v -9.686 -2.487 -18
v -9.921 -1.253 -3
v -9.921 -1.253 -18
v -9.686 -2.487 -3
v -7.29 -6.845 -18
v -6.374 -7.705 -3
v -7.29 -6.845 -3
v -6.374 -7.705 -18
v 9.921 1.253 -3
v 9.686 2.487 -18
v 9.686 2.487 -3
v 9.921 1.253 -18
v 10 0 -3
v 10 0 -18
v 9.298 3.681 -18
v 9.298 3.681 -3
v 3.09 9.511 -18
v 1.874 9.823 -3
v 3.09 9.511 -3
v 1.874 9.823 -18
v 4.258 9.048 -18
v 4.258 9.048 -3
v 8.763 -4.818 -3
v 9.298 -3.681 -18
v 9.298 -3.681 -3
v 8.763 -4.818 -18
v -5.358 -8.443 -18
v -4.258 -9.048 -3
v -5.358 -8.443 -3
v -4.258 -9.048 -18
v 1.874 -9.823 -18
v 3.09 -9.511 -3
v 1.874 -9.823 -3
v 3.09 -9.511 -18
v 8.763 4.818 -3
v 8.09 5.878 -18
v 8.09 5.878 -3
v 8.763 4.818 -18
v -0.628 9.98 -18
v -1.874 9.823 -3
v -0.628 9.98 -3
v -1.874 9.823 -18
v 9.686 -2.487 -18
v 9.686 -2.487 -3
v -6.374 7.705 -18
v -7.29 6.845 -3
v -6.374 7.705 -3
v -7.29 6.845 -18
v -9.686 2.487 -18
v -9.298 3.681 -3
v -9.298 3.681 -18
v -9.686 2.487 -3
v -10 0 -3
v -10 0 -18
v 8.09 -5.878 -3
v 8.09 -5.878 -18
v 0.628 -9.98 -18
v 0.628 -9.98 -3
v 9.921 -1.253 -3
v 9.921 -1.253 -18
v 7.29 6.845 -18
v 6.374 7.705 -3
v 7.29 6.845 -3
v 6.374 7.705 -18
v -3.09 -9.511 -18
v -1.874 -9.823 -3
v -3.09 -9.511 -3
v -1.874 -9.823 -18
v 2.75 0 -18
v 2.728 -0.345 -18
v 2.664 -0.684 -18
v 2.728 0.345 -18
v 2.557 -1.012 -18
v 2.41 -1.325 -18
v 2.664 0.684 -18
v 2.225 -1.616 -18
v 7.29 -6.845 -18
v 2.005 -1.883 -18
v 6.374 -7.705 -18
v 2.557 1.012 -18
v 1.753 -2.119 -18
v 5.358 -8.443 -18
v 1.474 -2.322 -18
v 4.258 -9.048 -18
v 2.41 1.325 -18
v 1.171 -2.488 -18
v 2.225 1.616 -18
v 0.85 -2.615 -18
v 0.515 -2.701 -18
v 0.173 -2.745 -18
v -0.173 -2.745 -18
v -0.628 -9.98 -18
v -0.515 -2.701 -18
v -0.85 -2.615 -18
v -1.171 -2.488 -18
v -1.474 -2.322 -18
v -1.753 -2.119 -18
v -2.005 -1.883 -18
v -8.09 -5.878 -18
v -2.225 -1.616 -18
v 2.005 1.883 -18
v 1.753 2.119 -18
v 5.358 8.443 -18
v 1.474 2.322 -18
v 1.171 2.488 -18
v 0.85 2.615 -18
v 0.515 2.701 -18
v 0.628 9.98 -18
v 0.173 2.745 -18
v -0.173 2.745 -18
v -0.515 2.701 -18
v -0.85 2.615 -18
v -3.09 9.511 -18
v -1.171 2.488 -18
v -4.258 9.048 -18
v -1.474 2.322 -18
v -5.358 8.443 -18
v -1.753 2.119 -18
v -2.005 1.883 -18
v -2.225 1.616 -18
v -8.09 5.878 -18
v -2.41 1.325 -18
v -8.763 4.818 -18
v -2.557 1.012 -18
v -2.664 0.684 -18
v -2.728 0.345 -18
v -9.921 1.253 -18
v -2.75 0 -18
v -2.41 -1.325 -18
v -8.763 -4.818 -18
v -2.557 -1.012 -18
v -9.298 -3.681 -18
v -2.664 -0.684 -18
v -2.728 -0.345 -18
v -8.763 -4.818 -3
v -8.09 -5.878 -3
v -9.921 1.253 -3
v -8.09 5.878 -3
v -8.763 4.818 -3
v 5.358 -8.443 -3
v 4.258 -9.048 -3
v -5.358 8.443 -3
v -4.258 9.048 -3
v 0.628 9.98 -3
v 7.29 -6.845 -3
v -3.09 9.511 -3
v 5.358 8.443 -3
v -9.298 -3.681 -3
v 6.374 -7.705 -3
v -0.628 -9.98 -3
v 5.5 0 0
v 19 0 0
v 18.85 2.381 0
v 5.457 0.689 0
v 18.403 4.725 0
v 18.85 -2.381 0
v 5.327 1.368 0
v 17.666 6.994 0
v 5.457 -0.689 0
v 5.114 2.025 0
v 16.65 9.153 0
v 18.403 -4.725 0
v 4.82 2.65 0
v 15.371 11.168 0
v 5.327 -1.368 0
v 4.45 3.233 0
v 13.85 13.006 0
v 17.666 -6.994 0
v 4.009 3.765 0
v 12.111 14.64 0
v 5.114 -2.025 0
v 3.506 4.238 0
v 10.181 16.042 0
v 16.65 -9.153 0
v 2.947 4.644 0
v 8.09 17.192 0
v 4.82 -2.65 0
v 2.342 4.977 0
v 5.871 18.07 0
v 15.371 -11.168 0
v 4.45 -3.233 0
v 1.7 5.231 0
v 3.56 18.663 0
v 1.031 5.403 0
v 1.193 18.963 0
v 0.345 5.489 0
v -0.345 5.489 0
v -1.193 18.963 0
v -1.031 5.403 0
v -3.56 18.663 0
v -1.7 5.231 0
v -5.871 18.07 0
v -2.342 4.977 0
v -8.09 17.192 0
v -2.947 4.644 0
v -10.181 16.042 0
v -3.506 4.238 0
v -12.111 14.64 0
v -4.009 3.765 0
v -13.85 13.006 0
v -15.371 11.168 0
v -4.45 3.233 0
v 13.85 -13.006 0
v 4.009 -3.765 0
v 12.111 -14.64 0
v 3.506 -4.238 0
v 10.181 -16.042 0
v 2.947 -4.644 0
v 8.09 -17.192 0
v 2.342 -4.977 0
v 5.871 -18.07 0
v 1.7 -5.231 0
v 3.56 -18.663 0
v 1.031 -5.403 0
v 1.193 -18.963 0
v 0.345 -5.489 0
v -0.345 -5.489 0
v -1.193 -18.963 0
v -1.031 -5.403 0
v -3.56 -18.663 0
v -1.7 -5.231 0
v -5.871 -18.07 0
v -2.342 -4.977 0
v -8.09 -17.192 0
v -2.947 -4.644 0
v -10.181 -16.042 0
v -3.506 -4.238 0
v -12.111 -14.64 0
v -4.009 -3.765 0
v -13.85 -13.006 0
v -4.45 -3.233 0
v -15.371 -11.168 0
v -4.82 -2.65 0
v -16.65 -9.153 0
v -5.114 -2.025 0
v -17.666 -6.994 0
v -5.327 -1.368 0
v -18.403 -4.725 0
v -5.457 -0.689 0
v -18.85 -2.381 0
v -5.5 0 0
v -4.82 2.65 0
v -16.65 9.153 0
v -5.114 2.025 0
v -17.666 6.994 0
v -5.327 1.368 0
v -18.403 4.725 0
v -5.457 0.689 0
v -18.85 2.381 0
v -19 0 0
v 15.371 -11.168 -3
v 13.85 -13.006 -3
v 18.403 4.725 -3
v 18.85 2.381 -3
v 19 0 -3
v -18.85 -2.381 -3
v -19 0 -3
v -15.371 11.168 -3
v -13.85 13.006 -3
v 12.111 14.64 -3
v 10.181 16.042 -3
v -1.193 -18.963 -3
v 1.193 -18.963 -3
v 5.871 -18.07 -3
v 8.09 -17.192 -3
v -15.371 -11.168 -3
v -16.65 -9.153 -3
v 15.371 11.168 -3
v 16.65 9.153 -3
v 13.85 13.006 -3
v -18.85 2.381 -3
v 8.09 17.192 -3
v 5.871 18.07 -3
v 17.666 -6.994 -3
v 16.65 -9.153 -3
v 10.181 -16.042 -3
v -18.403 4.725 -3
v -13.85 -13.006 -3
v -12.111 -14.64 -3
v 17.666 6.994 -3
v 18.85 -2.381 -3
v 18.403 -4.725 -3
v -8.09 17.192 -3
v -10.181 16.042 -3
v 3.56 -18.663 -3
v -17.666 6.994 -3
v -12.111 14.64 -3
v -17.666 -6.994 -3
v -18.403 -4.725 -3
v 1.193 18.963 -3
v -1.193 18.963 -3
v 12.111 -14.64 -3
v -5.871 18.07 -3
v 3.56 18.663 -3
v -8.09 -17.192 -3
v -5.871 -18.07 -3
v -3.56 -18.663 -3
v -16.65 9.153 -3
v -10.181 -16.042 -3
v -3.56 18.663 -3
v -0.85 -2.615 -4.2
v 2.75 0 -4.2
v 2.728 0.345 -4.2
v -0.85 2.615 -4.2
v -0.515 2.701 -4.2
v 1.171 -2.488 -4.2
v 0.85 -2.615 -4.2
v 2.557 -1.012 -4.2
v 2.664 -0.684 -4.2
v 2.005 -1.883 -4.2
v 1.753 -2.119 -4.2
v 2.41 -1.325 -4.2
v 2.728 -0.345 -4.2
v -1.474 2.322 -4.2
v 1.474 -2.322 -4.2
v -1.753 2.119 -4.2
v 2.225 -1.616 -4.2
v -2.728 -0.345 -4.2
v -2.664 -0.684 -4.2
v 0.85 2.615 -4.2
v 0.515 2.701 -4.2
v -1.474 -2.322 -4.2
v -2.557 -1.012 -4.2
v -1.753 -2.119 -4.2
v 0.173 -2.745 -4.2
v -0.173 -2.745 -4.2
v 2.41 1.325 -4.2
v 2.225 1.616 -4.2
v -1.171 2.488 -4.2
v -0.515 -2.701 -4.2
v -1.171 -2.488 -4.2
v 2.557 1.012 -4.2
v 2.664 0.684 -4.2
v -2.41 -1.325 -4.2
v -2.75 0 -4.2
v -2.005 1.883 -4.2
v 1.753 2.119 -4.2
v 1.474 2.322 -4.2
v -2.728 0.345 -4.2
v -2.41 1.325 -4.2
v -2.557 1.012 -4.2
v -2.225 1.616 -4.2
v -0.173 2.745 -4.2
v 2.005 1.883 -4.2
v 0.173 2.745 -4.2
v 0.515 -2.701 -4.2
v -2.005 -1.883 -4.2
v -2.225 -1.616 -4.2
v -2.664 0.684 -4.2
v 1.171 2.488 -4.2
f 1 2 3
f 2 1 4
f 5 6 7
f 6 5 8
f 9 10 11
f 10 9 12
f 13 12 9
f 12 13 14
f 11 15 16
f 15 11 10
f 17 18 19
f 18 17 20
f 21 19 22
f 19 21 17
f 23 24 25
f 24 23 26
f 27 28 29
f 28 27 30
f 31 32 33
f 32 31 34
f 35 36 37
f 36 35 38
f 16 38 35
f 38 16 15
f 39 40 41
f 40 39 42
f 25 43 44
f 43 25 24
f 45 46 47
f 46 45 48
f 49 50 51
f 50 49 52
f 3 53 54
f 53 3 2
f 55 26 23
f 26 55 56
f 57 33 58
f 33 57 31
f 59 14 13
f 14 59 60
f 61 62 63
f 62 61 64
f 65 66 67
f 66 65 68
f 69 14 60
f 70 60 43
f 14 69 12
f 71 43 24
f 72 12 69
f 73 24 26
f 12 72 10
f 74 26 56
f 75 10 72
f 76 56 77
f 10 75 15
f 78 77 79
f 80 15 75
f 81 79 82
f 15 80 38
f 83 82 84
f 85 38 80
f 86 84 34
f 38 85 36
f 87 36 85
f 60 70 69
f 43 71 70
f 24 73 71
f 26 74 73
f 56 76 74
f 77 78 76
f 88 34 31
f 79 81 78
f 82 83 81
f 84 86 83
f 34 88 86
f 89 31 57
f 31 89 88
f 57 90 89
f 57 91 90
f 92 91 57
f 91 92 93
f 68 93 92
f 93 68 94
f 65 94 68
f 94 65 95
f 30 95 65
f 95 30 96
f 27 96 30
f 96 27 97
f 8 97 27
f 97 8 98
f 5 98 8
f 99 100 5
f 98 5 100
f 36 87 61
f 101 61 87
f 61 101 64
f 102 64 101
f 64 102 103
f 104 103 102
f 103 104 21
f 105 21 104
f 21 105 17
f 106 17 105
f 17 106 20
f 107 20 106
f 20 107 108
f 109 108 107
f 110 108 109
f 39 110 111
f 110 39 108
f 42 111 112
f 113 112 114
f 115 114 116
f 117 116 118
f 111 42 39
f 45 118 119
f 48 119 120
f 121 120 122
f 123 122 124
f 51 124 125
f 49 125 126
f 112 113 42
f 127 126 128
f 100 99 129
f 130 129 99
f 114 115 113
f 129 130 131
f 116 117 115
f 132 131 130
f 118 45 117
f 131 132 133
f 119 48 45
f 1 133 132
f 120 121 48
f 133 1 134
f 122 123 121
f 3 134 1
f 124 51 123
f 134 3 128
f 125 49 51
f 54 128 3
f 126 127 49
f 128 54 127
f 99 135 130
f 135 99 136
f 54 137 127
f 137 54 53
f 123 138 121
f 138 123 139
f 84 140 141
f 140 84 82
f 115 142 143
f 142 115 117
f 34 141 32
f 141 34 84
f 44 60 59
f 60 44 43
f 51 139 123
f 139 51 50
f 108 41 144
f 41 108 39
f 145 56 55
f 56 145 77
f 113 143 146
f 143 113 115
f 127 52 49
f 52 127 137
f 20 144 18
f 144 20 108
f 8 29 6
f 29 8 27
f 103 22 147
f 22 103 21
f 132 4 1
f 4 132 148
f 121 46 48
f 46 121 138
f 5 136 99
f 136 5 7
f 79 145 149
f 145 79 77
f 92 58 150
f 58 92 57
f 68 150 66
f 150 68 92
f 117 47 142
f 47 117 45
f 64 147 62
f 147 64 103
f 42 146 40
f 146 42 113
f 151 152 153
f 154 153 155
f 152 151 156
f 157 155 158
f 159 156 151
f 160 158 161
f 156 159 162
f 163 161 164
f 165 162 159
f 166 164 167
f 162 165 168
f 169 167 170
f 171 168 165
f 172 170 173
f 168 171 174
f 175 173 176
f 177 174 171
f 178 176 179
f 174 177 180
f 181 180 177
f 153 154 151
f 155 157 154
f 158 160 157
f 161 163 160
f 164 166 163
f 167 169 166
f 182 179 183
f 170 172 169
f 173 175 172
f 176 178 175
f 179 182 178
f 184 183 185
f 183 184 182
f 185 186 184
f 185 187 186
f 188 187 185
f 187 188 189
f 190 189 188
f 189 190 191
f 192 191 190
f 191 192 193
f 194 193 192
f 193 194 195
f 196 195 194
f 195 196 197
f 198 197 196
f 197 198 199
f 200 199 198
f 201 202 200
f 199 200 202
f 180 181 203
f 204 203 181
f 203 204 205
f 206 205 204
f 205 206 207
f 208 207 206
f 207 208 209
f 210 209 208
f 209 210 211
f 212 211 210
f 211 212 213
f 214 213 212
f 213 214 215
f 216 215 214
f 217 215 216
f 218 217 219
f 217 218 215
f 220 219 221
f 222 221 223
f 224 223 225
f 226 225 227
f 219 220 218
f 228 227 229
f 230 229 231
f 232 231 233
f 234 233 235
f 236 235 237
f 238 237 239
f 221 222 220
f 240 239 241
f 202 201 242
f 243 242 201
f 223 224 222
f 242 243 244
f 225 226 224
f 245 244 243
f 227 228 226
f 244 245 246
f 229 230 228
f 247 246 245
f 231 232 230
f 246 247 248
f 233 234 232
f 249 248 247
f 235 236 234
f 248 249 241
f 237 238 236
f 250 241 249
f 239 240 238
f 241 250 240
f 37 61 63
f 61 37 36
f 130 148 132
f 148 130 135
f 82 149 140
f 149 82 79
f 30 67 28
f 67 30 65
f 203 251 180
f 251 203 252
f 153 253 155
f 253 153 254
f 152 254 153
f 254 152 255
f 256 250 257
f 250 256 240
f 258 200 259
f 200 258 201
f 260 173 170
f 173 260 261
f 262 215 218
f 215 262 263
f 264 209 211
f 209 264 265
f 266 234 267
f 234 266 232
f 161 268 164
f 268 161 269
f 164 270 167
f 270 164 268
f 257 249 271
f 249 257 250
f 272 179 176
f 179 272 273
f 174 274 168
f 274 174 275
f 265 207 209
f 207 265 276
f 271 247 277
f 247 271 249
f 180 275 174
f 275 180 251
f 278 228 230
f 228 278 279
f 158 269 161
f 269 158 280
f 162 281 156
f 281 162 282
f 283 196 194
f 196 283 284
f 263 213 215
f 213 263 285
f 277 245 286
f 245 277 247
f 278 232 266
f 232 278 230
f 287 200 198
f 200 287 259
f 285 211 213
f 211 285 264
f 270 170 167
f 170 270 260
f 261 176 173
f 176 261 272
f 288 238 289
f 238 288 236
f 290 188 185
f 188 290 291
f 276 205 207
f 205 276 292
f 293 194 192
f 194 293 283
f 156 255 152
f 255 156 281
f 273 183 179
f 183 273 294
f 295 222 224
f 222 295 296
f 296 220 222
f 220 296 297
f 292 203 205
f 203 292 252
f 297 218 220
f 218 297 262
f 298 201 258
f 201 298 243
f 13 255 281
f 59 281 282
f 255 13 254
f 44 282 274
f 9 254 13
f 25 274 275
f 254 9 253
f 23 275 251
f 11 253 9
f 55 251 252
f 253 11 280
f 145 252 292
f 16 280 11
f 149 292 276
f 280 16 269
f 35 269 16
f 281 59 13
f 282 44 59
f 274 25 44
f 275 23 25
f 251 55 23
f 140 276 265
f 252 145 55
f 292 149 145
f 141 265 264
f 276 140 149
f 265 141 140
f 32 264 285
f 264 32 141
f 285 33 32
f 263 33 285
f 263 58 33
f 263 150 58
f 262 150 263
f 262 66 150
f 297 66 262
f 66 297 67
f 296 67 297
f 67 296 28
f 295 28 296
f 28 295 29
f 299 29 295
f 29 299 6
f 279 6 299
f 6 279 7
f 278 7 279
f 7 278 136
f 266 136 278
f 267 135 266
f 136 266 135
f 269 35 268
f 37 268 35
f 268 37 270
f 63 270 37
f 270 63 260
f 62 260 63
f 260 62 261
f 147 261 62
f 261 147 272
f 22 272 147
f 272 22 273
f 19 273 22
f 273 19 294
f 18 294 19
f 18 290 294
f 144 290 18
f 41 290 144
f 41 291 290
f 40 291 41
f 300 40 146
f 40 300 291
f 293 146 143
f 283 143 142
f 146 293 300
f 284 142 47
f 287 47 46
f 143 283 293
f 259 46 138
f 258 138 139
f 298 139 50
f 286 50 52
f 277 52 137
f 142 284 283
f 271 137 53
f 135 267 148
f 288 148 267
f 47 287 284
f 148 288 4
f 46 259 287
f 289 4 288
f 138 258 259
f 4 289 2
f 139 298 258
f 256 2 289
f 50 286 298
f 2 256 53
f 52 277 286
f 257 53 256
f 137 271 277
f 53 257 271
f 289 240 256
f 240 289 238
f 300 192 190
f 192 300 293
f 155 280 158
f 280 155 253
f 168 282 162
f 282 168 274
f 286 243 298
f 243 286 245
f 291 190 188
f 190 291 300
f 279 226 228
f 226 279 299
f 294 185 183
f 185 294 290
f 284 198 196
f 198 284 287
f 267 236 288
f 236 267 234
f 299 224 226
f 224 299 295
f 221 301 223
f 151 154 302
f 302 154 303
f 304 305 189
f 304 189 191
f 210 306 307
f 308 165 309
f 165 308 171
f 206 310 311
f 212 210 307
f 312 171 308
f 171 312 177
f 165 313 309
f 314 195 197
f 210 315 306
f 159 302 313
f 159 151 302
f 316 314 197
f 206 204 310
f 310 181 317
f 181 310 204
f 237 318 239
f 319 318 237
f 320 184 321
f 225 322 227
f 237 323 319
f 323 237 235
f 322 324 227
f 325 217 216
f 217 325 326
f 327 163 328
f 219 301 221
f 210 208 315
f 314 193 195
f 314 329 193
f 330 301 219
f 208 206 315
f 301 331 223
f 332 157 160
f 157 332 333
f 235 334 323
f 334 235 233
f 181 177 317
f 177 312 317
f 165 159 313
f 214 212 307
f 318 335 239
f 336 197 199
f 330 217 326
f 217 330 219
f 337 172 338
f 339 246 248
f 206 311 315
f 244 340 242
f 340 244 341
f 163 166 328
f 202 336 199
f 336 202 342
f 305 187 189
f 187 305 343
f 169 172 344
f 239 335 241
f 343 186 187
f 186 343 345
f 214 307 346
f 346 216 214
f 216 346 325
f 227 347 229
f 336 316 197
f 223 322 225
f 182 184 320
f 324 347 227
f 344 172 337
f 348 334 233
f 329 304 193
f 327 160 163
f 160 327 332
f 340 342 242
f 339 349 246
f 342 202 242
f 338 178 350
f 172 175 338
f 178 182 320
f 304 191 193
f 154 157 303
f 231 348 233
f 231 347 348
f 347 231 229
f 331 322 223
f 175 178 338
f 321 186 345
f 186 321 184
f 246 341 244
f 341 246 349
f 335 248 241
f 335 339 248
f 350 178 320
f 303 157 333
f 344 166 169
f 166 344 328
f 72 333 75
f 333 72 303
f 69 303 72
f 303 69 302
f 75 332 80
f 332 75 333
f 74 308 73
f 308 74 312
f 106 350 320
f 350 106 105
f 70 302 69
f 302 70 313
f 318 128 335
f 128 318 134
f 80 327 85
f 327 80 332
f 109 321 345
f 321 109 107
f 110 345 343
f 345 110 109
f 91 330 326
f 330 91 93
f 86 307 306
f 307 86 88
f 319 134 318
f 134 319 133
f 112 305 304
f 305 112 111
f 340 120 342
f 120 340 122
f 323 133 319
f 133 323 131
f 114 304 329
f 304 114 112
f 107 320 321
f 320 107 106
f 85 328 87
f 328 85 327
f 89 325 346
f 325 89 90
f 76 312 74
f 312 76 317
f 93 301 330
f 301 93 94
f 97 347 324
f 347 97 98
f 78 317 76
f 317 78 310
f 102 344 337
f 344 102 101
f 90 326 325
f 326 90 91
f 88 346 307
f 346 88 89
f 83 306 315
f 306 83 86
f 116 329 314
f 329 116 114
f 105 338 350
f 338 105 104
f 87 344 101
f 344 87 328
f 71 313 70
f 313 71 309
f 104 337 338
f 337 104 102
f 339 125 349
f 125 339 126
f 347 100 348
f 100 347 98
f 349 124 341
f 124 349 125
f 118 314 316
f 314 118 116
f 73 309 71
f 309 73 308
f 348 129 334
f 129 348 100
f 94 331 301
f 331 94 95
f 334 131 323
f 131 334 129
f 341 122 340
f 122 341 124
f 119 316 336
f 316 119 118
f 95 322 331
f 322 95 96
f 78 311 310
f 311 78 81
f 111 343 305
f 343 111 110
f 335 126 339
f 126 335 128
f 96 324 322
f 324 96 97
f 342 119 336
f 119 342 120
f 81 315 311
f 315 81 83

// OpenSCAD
$fn = 50;


difference() {
	union() {
		translate(v = [0, 0, -18.0000000000]) {
			cylinder(h = 18, r = 10.0000000000);
		}
		translate(v = [0, 0, -3.0000000000]) {
			cylinder(h = 3, r = 19.0000000000);
		}
	}
	union() {
		translate(v = [0, 0, 0]) {
			rotate(a = [0, 0, 0]) {
				difference() {
					union() {
						#translate(v = [0, 0, -18.0000000000]) {
							cylinder(h = 18, r = 2.2500000000);
						}
						#translate(v = [0, 0, -4.2000000000]) {
							cylinder(h = 4.2000000000, r = 10.0000000000, r1 = 2.7500000000, r2 = 5.5000000000);
						}
						#translate(v = [0, 0, -18.0000000000]) {
							cylinder(h = 18, r = 2.7500000000);
						}
						#translate(v = [0, 0, -18.0000000000]) {
							cylinder(h = 18, r = 2.2500000000);
						}
					}
					union();
				}
			}
		}
	}
}
